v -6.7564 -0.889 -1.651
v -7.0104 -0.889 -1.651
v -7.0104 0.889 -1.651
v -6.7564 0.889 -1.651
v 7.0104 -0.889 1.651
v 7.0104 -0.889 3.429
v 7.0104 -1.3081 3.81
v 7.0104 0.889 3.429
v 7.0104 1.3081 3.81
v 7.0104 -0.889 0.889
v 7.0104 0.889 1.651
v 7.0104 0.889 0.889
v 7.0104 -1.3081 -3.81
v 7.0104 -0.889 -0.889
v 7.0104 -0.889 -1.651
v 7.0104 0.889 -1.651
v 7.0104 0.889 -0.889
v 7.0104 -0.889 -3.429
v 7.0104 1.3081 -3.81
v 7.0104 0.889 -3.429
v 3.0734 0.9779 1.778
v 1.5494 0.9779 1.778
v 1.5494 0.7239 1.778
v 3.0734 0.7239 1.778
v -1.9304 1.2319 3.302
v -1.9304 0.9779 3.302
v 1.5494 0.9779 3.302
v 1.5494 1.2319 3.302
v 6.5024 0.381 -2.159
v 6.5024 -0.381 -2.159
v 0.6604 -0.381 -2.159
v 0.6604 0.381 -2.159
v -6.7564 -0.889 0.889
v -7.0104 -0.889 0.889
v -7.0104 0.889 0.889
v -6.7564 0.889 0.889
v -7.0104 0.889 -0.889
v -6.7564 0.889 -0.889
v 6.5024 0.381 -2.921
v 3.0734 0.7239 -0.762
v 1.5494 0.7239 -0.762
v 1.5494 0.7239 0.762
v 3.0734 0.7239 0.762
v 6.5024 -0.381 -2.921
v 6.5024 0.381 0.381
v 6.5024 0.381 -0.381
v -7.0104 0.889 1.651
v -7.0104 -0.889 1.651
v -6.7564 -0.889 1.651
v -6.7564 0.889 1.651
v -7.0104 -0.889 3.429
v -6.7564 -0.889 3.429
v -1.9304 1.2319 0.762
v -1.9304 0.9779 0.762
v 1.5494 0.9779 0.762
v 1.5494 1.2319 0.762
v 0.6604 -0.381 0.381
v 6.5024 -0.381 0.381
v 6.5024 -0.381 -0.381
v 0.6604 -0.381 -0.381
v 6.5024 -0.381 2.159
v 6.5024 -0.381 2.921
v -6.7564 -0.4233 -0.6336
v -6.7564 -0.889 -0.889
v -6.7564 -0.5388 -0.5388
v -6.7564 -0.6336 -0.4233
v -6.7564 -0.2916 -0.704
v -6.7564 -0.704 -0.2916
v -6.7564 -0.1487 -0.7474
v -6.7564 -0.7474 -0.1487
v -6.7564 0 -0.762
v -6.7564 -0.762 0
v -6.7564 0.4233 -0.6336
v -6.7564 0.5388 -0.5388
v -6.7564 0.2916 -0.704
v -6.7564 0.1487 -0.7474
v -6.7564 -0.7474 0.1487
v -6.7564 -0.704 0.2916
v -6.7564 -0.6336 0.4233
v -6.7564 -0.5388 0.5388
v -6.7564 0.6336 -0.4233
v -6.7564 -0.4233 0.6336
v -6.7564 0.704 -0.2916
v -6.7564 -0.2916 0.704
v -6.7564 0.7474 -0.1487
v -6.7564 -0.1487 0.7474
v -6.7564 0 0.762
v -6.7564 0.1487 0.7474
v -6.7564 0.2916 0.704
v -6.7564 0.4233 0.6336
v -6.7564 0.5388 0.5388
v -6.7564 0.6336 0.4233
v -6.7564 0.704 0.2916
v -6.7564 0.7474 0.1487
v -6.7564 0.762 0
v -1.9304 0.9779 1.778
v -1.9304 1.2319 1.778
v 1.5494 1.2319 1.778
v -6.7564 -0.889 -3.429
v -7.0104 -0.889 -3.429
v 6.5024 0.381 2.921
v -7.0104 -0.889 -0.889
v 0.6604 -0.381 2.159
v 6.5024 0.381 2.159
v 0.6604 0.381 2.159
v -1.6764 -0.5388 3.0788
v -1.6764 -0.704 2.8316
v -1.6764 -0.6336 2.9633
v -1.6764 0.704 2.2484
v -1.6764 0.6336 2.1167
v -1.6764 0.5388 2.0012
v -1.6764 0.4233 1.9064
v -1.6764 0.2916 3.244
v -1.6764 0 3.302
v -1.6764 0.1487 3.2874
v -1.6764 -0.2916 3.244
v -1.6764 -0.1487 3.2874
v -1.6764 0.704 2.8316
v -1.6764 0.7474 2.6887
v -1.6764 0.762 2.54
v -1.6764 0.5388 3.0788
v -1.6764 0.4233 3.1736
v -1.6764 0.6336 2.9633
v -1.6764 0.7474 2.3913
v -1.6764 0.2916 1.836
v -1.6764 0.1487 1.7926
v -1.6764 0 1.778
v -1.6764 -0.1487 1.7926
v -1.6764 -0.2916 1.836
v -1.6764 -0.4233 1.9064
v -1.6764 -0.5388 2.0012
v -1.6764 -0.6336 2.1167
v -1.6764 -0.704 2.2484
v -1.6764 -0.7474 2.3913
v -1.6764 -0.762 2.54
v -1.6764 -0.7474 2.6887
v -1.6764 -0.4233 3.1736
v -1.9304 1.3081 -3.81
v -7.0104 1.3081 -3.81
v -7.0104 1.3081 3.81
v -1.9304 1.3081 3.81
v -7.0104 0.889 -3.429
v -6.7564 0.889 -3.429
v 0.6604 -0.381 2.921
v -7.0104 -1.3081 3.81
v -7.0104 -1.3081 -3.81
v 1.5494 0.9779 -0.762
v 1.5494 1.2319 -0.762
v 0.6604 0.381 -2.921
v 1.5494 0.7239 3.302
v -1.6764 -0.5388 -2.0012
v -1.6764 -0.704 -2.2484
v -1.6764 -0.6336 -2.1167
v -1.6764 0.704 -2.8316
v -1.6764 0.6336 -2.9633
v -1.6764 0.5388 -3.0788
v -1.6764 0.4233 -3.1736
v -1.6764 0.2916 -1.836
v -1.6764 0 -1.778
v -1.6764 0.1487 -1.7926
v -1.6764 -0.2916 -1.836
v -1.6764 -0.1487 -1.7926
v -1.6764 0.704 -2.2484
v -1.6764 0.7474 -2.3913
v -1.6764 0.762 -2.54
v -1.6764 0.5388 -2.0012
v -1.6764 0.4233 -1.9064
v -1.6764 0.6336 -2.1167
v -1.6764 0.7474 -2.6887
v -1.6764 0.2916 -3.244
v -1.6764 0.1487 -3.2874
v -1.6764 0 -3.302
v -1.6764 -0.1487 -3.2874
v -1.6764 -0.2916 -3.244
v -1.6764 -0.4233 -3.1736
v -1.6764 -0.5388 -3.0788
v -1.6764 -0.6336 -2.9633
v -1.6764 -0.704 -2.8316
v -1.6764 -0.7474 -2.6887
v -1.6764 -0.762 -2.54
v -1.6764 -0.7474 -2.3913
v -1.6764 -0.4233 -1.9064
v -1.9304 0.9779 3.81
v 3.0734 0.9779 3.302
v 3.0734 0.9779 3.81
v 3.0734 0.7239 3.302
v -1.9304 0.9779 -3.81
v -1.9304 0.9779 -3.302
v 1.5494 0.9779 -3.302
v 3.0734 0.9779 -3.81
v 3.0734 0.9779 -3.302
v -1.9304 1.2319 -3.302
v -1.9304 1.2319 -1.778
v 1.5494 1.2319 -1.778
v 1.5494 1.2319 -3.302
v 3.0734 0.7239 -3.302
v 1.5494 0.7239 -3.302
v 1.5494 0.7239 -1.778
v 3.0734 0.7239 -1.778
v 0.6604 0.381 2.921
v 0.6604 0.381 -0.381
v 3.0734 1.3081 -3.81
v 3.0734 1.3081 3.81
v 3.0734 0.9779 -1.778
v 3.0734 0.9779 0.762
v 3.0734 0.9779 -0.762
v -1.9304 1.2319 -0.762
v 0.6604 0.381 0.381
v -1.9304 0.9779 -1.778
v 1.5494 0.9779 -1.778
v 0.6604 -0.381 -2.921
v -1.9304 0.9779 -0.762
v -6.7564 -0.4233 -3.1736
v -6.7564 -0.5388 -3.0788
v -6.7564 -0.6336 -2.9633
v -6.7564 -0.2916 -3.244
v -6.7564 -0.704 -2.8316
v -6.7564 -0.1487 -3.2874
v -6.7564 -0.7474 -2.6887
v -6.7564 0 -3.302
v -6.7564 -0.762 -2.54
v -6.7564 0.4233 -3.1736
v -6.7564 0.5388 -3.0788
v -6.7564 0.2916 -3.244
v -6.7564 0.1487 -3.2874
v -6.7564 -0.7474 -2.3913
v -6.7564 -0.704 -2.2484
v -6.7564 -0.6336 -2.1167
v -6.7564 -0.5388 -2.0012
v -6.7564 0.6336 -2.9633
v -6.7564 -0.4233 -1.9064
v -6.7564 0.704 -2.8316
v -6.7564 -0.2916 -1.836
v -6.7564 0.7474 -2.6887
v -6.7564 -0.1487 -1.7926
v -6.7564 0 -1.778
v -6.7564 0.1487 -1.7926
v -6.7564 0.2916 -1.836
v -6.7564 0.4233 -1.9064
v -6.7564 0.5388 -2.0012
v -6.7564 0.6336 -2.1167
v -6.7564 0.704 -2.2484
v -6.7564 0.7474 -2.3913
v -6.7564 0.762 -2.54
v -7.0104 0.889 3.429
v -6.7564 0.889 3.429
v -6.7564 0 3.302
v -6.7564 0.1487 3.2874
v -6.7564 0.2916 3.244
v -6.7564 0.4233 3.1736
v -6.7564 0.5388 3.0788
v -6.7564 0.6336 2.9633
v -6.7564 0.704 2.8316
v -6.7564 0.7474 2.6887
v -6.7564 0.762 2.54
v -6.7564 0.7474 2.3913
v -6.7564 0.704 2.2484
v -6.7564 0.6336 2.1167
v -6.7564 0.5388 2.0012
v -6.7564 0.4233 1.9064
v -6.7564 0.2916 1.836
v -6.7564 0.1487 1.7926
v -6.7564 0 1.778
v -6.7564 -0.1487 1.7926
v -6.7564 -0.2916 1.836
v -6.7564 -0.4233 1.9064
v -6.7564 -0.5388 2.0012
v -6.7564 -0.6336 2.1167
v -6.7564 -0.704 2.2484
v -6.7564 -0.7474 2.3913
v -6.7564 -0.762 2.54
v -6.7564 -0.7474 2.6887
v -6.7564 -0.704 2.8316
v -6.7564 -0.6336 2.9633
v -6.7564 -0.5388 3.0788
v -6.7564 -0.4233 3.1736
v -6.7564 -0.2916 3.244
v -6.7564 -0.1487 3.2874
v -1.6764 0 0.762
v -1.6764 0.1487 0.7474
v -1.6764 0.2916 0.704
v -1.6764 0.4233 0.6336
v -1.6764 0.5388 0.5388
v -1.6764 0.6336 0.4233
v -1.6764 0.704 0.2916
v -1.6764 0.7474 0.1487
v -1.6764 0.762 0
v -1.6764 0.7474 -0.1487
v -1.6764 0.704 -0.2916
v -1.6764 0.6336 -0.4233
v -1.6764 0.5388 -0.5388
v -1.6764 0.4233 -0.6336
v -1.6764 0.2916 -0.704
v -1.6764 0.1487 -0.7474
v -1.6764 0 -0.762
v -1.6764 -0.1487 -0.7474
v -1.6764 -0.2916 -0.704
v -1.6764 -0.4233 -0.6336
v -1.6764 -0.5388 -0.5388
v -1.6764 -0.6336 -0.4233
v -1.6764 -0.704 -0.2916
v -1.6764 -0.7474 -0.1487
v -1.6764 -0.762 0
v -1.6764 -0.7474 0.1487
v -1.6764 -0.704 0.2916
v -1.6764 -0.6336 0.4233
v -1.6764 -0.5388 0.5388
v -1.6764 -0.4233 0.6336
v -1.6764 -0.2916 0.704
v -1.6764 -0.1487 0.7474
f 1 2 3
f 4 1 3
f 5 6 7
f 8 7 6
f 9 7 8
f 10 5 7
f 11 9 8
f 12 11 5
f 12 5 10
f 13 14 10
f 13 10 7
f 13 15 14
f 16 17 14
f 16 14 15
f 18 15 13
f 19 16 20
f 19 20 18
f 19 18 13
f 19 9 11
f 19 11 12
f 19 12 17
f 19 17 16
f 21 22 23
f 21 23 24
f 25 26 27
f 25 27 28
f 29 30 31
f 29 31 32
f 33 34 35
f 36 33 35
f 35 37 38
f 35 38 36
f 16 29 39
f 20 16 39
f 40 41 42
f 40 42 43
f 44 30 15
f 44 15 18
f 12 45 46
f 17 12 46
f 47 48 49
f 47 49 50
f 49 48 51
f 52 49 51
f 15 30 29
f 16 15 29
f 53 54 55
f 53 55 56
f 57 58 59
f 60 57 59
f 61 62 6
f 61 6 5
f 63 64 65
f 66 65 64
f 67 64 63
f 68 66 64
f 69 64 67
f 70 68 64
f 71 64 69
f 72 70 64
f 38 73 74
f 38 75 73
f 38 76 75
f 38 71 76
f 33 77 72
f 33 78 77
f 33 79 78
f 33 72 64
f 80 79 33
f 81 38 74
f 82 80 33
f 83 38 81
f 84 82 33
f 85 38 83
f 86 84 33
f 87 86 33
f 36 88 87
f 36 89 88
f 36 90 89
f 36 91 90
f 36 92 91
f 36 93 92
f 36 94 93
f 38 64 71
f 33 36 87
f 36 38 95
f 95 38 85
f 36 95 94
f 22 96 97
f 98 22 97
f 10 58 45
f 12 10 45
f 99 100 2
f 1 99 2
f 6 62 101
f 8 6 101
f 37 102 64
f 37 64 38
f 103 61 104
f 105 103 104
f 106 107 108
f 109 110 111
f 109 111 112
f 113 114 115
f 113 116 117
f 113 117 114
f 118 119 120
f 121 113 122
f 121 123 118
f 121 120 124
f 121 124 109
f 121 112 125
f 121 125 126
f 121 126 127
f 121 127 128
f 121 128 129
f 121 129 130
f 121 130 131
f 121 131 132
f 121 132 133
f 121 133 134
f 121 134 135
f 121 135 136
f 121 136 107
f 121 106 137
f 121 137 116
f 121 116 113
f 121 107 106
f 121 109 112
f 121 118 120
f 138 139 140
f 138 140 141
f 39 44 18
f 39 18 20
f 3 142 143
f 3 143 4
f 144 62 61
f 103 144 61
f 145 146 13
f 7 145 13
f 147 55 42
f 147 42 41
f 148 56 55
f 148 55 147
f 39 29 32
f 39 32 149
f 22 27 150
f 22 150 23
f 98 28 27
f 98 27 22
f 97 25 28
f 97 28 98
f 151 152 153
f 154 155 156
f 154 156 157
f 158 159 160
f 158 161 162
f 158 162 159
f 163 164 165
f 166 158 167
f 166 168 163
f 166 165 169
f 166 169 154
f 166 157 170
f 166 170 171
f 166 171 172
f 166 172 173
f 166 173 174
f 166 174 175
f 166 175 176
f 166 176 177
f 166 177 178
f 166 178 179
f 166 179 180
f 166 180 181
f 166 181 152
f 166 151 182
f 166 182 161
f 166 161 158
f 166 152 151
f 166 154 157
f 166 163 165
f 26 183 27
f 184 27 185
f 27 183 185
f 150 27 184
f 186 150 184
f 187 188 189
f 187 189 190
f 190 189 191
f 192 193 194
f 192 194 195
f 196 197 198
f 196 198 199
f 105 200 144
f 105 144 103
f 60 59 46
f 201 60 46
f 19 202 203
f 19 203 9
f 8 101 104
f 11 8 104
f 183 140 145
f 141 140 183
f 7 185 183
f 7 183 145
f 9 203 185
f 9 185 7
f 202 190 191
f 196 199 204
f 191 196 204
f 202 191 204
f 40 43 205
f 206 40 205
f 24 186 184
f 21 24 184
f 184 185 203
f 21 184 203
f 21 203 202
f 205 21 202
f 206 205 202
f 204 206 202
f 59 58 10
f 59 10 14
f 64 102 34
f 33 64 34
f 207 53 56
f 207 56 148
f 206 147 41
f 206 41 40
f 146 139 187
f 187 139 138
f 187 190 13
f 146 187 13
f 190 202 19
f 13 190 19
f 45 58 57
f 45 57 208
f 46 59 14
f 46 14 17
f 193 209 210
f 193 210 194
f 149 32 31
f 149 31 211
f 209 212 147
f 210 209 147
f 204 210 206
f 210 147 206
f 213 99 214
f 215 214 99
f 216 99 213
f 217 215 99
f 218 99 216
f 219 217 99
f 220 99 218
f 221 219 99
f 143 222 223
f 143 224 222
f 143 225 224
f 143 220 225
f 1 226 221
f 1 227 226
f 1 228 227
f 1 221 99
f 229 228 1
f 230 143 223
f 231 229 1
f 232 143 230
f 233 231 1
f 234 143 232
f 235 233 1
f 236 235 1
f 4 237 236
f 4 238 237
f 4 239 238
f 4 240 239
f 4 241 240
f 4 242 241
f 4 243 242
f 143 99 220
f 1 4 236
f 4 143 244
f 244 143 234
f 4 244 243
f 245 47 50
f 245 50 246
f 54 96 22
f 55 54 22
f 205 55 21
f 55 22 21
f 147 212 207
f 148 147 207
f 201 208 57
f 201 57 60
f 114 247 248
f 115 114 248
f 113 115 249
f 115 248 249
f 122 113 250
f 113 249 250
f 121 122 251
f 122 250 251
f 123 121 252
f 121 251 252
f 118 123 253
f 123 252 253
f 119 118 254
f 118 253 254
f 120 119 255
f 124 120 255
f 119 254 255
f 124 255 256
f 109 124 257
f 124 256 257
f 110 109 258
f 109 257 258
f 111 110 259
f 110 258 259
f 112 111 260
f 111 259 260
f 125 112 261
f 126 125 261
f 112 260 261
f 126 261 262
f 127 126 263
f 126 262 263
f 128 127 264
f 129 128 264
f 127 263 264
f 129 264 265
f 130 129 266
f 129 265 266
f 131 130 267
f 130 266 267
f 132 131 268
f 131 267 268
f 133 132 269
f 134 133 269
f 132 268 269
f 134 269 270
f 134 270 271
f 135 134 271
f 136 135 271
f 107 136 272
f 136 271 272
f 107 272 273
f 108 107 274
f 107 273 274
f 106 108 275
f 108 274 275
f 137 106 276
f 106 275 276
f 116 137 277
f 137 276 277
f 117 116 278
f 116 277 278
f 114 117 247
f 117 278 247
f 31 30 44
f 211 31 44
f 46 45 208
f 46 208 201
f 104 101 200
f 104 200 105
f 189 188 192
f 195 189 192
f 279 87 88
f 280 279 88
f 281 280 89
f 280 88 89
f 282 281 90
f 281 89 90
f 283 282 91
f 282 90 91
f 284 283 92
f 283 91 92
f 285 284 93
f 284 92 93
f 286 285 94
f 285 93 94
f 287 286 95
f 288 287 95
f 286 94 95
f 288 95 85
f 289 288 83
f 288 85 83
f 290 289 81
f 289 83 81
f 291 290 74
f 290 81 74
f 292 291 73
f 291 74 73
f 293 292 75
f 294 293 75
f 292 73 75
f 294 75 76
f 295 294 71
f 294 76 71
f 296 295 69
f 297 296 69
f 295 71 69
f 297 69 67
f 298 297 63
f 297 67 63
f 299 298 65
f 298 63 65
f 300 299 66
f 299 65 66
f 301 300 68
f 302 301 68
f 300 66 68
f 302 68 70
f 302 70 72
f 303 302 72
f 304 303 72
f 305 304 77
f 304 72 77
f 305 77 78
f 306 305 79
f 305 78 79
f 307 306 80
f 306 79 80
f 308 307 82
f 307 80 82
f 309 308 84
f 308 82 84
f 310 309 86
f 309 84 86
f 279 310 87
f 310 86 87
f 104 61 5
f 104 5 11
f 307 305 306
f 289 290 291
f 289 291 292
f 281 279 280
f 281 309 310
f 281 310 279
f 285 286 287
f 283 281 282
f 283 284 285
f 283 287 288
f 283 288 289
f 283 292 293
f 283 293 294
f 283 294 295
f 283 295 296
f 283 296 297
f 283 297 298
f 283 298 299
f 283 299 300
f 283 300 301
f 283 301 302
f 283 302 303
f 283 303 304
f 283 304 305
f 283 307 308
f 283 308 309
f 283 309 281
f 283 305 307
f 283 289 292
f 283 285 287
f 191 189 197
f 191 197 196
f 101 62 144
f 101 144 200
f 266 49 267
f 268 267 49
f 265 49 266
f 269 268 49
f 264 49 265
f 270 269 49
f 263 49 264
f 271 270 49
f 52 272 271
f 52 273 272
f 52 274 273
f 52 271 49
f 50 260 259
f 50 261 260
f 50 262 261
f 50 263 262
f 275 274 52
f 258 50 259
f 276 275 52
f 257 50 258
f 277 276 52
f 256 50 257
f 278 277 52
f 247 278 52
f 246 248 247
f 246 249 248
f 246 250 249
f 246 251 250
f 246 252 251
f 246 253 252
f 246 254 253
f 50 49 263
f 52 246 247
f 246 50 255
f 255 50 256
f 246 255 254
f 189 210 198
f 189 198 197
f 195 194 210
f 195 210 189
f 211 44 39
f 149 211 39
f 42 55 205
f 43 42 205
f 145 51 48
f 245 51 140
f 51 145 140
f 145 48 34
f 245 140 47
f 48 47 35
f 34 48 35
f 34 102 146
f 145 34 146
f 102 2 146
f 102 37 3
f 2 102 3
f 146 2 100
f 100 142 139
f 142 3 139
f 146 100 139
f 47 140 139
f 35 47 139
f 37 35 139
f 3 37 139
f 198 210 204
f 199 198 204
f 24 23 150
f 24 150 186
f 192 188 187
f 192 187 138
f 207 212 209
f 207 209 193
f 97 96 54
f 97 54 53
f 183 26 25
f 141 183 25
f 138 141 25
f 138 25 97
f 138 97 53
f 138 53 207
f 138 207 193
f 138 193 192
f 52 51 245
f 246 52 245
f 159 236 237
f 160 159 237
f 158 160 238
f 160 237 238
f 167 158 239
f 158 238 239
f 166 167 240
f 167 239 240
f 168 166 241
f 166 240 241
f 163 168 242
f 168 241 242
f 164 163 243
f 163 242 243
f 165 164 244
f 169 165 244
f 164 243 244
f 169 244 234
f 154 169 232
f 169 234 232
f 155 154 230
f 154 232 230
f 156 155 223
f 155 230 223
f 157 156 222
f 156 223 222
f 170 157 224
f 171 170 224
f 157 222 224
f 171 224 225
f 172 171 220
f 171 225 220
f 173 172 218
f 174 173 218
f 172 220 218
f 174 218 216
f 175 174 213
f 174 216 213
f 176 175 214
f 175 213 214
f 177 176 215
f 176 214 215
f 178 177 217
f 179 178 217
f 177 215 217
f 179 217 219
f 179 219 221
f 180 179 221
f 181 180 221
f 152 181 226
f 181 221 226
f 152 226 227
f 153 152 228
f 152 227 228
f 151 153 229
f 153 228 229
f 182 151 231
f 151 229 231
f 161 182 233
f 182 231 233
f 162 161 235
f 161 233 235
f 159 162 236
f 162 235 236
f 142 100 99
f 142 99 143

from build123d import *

# Parameters (mm, degrees)
SKETCH1_W           = 14.0208
SKETCH1_H           = 7.62
BOSS_EXTRUDE1_DEPTH = 1.3081
SKETCH2_W           = 0.762
SKETCH2_H           = 0.762
CUT_EXTRUDE1_DEPTH  = 6.35
CHAMFER1_SIZE       = 0.508
SKETCH3_W           = 1.778
SKETCH3_H           = 1.778
CUT_EXTRUDE2_DEPTH  = 0.254
SKETCH4_R           = 0.762
CUT_EXTRUDE3_DEPTH  = 5.08
SKETCH5_W           = 5.0038
SKETCH5_H           = 0.6604
CUT_EXTRUDE4_DEPTH  = 8.62
SKETCH6_W           = 1.524
SKETCH6_H           = 0.381
SKETCH6_H_2         = 0.762
SKETCH6_H_3         = 1.524
CUT_EXTRUDE5_DEPTH  = 0.254
SKETCH7_W           = 1.524
SKETCH7_H           = 0.254
BOSS_EXTRUDE2_DEPTH = 3.4798


with BuildPart() as part:
    # Sketch1 → Boss-Extrude1 (new body, symmetric)
    with BuildSketch(Plane(origin=(0, 0, 0), x_dir=(1, 0, 0), z_dir=(0, 1, 0))):
        Rectangle(SKETCH1_W, SKETCH1_H)
    extrude(amount=BOSS_EXTRUDE1_DEPTH, both=True)

    # Sketch2 → Cut-Extrude1 (cut)
    with BuildSketch(Plane(origin=(7.0104, 0, 0), x_dir=(0, 0, -1), z_dir=(1, 0, 0))):
        Rectangle(SKETCH2_W, SKETCH2_H)
        with Locations((-2.54, 0)):
            Rectangle(SKETCH2_W, SKETCH2_H)
        with Locations((2.54, 0)):
            Rectangle(SKETCH2_W, SKETCH2_H)
    extrude(amount=-CUT_EXTRUDE1_DEPTH, mode=Mode.SUBTRACT)

    # Chamfer1
    chamfer1_edges = [part.edges().sort_by_distance(p)[0] for p in [
        (7.0104, -0.381, 2.54),
        (7.0104, 0, 2.159),
        (7.0104, 0.381, 2.54),
        (7.0104, 0, 2.921),
        (7.0104, -0.381, 0),
        (7.0104, 0, -0.381),
        (7.0104, 0.381, 0),
        (7.0104, 0, 0.381),
        (7.0104, -0.381, -2.54),
        (7.0104, 0, -2.921),
        (7.0104, 0.381, -2.54),
        (7.0104, 0, -2.159),
    ]]
    chamfer(chamfer1_edges, length=CHAMFER1_SIZE)

    # Sketch3 → Cut-Extrude2 (cut)
    with BuildSketch(Plane.ZY.offset(7.0104)):
        with Locations((-2.54, 0)):
            Rectangle(SKETCH3_W, SKETCH3_H)
        Rectangle(SKETCH3_W, SKETCH3_H)
        with Locations((2.54, 0)):
            Rectangle(SKETCH3_W, SKETCH3_H)
    extrude(amount=-CUT_EXTRUDE2_DEPTH, mode=Mode.SUBTRACT)

    # Sketch4 → Cut-Extrude3 (cut)
    with BuildSketch(Plane.ZY.offset(6.7564)):
        with Locations((-2.54, 0)):
            Circle(SKETCH4_R)
        Circle(SKETCH4_R)
        with Locations((2.54, 0)):
            Circle(SKETCH4_R)
    extrude(amount=-CUT_EXTRUDE3_DEPTH, mode=Mode.SUBTRACT)

    # Sketch5 → Cut-Extrude4 (cut, through all)
    with BuildSketch(Plane.XY.offset(3.81)):
        with Locations((0.5715, 1.3081)):
            Rectangle(SKETCH5_W, SKETCH5_H)
    extrude(amount=-CUT_EXTRUDE4_DEPTH, mode=Mode.SUBTRACT)

    # Sketch6 → Cut-Extrude5 (cut)
    with BuildSketch(Plane(origin=(0, 0.9779, 0), x_dir=(1, 0, 0), z_dir=(0, 1, 0))):
        with Locations((2.3114, 3.1115)):
            Rectangle(SKETCH6_W, SKETCH6_H)
        with Locations((2.3114, 2.54)):
            Rectangle(SKETCH6_W, SKETCH6_H_2)
        with Locations((2.3114, 1.9685)):
            Rectangle(SKETCH6_W, SKETCH6_H)
        with Locations((2.3114, 0)):
            Rectangle(SKETCH6_W, SKETCH6_H_3)
        with Locations((2.3114, -2.54)):
            Rectangle(SKETCH6_W, SKETCH6_H_3)
    extrude(amount=-CUT_EXTRUDE5_DEPTH, mode=Mode.SUBTRACT)

    # Sketch7 → Boss-Extrude2 (add)
    with BuildSketch(Plane(origin=(-1.9304, 0, 0), x_dir=(0, 0, -1), z_dir=(1, 0, 0))):
        with Locations((2.54, 1.1049)):
            Rectangle(SKETCH7_W, SKETCH7_H)
        with Locations((0, 1.1049)):
            Rectangle(SKETCH7_W, SKETCH7_H)
        with Locations((-2.54, 1.1049)):
            Rectangle(SKETCH7_W, SKETCH7_H)
    extrude(amount=BOSS_EXTRUDE2_DEPTH)


solid = part.part
